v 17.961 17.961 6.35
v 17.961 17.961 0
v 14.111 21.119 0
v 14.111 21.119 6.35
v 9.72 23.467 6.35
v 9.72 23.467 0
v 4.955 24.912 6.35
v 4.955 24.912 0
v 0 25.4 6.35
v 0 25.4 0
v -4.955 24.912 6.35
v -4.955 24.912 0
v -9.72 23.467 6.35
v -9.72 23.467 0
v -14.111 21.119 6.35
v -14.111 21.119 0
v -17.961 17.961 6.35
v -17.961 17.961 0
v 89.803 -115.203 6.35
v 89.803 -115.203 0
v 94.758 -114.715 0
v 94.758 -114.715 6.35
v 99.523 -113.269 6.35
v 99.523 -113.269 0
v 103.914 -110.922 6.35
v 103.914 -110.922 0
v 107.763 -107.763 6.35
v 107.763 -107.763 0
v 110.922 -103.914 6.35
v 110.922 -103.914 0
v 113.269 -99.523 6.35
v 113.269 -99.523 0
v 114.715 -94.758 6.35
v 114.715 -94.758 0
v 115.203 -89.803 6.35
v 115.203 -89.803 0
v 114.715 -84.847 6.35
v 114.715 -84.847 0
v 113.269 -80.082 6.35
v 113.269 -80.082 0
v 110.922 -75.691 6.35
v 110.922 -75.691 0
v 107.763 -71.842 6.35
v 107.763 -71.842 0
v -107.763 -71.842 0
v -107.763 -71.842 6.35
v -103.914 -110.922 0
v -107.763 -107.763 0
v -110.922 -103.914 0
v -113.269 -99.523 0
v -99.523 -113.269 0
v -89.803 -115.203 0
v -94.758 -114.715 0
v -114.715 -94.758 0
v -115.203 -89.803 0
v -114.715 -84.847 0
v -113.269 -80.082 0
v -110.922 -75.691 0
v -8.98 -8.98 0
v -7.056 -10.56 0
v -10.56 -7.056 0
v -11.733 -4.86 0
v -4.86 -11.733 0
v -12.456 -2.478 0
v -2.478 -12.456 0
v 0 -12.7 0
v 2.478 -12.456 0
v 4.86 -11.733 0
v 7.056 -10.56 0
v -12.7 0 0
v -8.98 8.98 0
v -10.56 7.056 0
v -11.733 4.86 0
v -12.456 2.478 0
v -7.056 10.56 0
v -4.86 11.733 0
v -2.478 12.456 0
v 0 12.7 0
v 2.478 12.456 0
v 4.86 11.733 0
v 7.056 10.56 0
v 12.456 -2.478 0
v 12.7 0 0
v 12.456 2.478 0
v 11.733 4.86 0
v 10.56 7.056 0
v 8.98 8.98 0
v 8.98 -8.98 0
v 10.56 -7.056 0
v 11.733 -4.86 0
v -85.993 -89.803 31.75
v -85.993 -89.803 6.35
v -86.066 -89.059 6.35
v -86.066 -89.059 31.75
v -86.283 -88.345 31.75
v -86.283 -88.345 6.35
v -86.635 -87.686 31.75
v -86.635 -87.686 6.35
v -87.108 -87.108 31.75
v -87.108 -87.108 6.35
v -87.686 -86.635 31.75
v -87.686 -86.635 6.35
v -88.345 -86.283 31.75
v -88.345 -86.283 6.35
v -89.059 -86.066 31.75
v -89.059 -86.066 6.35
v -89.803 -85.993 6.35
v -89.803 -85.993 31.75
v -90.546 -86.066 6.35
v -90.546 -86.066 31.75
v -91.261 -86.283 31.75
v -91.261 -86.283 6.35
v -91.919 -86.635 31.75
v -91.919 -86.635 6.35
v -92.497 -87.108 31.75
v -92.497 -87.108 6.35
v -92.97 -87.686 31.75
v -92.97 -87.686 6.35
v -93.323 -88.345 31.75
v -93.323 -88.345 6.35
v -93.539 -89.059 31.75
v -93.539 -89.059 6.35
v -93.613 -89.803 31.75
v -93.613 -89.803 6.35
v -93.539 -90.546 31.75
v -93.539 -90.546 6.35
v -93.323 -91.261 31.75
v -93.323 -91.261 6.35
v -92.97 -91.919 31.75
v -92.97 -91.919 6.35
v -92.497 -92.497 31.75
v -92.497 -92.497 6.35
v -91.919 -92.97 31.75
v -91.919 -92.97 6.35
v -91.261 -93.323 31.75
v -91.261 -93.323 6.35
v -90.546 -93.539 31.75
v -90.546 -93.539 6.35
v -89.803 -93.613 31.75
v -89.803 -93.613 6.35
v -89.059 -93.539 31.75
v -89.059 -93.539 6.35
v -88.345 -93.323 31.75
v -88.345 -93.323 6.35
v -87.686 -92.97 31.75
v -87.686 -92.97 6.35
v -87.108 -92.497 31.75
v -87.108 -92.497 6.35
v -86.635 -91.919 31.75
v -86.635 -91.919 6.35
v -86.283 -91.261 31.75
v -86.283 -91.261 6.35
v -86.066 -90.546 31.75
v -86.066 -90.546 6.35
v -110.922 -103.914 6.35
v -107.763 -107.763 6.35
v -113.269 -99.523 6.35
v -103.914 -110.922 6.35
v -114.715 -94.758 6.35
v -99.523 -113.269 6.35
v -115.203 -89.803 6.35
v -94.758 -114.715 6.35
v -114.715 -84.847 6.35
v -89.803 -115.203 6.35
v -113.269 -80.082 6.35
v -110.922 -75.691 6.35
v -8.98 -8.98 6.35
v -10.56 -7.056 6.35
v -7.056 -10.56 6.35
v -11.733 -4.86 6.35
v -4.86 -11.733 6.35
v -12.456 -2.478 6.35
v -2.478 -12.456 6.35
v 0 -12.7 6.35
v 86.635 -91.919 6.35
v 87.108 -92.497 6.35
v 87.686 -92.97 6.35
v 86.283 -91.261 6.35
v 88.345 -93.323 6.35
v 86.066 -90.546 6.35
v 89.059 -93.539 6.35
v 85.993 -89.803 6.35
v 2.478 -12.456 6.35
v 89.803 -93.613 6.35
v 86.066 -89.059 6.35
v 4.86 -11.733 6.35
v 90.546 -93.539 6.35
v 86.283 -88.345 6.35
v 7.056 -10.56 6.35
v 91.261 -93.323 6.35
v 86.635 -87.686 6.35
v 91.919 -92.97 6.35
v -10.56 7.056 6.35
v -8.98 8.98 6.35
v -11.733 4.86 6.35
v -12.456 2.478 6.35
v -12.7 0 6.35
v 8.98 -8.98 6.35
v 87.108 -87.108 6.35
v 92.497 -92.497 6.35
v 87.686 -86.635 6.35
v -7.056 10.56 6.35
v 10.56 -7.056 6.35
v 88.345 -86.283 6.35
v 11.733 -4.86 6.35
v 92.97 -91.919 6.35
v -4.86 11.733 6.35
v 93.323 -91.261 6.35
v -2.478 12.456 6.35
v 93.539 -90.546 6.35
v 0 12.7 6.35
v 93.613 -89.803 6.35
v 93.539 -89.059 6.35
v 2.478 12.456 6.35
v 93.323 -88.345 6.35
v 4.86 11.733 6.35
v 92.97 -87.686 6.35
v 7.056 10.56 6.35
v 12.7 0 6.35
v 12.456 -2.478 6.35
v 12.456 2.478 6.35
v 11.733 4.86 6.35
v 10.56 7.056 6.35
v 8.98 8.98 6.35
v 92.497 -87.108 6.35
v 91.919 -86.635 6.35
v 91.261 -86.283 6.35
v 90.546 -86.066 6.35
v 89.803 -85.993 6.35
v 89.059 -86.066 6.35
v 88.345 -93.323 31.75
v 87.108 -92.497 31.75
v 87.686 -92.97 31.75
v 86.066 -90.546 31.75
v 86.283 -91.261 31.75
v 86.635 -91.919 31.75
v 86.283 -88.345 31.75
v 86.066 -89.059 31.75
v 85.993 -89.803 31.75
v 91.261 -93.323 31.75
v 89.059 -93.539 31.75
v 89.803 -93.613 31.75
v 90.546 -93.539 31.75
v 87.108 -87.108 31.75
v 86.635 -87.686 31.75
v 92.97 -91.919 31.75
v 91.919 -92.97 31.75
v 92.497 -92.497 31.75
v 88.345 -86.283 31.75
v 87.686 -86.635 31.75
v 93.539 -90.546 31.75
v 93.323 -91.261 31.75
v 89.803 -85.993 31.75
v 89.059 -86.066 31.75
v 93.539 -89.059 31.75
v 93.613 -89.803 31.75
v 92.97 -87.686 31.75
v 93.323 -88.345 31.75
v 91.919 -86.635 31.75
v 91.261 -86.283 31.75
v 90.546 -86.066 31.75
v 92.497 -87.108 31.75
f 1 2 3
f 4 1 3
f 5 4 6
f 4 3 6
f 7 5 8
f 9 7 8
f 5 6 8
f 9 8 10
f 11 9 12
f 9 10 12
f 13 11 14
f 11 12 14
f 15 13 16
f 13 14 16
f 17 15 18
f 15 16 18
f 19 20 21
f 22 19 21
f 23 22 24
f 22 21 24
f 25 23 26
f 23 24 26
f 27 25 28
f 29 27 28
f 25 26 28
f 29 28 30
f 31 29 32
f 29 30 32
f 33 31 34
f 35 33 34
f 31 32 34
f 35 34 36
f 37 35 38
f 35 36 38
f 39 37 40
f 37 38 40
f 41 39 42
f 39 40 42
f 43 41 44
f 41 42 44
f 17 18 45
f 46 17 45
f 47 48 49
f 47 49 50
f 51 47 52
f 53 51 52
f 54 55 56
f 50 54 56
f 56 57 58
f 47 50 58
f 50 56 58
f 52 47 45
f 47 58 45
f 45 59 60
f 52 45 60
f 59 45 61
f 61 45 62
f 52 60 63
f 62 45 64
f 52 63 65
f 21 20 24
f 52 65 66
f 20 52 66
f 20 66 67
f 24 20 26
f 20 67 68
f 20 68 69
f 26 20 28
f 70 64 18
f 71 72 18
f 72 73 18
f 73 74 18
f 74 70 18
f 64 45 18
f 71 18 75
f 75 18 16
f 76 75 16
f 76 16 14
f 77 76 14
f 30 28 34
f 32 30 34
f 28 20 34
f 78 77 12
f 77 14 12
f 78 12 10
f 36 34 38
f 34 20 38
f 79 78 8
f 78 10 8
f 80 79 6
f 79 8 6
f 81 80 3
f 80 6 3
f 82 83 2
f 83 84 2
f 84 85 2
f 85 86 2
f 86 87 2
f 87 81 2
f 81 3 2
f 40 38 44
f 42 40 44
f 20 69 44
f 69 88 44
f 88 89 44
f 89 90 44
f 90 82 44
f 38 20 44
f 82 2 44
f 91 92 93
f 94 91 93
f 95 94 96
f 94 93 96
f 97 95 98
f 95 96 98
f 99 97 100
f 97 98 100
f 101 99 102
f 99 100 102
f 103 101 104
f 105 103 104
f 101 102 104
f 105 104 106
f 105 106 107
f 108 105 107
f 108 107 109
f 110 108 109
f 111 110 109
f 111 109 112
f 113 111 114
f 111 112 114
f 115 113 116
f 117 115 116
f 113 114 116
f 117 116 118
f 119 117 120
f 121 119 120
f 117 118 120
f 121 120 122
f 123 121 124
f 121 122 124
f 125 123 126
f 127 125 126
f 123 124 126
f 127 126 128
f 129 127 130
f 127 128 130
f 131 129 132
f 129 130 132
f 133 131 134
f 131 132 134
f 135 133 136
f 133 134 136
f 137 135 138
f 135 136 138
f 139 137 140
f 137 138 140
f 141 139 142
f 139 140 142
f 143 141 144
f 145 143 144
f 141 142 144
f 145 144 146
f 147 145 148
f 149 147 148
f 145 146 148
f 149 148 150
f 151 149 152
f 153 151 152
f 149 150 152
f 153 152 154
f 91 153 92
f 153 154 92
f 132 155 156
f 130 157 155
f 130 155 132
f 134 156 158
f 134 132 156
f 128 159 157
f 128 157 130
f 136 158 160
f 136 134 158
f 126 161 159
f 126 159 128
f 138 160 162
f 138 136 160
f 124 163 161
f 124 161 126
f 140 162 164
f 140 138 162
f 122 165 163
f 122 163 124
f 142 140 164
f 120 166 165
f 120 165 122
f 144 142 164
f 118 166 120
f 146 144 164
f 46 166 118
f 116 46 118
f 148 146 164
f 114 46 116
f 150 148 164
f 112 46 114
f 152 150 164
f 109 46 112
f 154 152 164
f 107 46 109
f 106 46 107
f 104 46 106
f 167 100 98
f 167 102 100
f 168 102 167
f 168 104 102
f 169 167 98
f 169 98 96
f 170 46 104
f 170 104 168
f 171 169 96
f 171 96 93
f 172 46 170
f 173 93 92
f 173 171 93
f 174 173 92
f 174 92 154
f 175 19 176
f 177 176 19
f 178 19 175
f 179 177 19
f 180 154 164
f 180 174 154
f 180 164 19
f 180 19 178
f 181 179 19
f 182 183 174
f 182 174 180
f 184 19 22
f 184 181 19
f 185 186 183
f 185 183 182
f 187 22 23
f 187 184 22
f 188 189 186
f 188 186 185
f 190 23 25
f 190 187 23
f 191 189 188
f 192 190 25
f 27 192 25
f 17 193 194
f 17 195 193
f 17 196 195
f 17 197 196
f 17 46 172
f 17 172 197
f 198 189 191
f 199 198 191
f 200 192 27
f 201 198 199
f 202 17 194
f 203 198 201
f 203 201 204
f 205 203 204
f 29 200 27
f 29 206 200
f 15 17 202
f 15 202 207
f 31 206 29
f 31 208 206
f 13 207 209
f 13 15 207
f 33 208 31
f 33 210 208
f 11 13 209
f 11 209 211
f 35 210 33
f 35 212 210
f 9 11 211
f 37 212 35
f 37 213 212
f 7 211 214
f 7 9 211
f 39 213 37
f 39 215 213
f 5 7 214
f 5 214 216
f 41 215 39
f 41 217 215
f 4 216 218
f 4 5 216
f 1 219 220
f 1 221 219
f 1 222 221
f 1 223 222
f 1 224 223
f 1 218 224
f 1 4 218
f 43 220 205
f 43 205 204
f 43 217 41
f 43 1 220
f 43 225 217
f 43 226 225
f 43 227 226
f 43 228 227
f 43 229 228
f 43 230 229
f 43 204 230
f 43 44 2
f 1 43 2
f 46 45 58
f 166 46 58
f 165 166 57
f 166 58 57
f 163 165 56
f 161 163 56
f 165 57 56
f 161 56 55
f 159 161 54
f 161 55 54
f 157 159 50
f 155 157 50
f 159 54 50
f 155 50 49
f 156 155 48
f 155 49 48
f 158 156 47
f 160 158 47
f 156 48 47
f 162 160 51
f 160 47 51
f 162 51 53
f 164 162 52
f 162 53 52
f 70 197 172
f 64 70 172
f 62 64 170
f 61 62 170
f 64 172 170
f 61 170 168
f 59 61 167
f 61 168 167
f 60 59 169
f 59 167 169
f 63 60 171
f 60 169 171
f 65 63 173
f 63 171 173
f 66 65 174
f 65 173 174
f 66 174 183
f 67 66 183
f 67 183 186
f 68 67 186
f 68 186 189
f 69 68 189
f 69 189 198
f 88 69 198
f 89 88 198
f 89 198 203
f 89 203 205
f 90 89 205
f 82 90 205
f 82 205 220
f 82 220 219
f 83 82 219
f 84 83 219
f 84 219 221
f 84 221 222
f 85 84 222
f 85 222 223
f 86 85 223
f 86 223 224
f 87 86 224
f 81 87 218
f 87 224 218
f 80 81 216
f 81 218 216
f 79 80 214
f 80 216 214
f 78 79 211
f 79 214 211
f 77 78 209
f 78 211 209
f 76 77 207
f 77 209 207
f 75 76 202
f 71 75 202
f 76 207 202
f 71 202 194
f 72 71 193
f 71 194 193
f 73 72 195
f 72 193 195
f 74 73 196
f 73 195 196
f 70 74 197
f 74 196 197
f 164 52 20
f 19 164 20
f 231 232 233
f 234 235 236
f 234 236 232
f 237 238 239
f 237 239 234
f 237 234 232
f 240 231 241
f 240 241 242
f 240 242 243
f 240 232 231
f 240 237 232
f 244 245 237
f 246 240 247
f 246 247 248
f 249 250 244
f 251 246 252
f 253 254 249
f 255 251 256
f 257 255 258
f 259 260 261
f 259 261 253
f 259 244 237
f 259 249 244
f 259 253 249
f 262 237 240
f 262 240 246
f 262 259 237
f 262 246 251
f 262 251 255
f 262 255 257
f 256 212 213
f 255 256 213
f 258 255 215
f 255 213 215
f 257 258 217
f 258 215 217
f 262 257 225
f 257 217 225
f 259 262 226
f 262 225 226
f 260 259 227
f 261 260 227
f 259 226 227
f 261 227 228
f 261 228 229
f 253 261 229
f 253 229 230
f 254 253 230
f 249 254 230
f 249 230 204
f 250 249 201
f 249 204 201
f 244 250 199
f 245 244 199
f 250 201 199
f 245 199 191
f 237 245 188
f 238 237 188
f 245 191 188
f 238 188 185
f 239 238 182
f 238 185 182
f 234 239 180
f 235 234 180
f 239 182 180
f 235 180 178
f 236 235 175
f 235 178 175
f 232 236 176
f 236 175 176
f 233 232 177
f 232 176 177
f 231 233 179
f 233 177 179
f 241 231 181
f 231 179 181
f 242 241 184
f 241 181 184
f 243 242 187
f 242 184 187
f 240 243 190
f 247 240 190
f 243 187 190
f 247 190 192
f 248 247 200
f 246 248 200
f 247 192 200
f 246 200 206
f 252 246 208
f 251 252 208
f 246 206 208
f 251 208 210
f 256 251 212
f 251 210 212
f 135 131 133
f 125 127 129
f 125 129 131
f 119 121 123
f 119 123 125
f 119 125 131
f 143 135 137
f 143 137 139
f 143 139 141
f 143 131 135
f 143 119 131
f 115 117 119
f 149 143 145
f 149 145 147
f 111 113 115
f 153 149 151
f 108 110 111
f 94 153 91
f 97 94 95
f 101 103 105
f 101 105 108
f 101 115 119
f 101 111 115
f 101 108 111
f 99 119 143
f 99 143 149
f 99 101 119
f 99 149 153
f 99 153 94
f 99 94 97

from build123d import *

# Parameters (mm, degrees)
F2_DEPTH = 6.35
F3_R     = 3.81
F4_DEPTH = 25.4
F5_D     = 25.4


with BuildPart() as f2:
    # F1 (on Top) → F2 (new body)
    with BuildSketch(Plane.XY):
        with BuildLine():
            ThreePointArc((89.802561, -115.202561), (113.269101, -99.52272), (107.763073, -71.842049))
            Line((107.763073, -71.842049), (17.960512, 17.960512))
            ThreePointArc((17.960512, 17.960512), (0, 25.4), (-17.960512, 17.960512))
            Line((-17.960512, 17.960512), (-107.763073, -71.842049))
            ThreePointArc((-107.763073, -71.842049), (-113.269101, -99.52272), (-89.802561, -115.202561))
            Line((-89.802561, -115.202561), (89.802561, -115.202561))
        make_face()
    extrude(amount=F2_DEPTH)

    # F3 (on face) → F4 (join)
    with BuildSketch(Plane.XY.offset(6.35)):
        with Locations((89.802561, -89.802561)):
            Circle(F3_R)
        with Locations((-89.802561, -89.802561)):
            Circle(F3_R)
    extrude(amount=F4_DEPTH)

    # F5 (through all)
    with Locations(Plane(origin=(0, 0, 0), x_dir=(1, 0, 0), z_dir=(0, 0, -1))):
        with Locations((0, 0)):
            Hole(F5_D / 2)


solid = f2.part
